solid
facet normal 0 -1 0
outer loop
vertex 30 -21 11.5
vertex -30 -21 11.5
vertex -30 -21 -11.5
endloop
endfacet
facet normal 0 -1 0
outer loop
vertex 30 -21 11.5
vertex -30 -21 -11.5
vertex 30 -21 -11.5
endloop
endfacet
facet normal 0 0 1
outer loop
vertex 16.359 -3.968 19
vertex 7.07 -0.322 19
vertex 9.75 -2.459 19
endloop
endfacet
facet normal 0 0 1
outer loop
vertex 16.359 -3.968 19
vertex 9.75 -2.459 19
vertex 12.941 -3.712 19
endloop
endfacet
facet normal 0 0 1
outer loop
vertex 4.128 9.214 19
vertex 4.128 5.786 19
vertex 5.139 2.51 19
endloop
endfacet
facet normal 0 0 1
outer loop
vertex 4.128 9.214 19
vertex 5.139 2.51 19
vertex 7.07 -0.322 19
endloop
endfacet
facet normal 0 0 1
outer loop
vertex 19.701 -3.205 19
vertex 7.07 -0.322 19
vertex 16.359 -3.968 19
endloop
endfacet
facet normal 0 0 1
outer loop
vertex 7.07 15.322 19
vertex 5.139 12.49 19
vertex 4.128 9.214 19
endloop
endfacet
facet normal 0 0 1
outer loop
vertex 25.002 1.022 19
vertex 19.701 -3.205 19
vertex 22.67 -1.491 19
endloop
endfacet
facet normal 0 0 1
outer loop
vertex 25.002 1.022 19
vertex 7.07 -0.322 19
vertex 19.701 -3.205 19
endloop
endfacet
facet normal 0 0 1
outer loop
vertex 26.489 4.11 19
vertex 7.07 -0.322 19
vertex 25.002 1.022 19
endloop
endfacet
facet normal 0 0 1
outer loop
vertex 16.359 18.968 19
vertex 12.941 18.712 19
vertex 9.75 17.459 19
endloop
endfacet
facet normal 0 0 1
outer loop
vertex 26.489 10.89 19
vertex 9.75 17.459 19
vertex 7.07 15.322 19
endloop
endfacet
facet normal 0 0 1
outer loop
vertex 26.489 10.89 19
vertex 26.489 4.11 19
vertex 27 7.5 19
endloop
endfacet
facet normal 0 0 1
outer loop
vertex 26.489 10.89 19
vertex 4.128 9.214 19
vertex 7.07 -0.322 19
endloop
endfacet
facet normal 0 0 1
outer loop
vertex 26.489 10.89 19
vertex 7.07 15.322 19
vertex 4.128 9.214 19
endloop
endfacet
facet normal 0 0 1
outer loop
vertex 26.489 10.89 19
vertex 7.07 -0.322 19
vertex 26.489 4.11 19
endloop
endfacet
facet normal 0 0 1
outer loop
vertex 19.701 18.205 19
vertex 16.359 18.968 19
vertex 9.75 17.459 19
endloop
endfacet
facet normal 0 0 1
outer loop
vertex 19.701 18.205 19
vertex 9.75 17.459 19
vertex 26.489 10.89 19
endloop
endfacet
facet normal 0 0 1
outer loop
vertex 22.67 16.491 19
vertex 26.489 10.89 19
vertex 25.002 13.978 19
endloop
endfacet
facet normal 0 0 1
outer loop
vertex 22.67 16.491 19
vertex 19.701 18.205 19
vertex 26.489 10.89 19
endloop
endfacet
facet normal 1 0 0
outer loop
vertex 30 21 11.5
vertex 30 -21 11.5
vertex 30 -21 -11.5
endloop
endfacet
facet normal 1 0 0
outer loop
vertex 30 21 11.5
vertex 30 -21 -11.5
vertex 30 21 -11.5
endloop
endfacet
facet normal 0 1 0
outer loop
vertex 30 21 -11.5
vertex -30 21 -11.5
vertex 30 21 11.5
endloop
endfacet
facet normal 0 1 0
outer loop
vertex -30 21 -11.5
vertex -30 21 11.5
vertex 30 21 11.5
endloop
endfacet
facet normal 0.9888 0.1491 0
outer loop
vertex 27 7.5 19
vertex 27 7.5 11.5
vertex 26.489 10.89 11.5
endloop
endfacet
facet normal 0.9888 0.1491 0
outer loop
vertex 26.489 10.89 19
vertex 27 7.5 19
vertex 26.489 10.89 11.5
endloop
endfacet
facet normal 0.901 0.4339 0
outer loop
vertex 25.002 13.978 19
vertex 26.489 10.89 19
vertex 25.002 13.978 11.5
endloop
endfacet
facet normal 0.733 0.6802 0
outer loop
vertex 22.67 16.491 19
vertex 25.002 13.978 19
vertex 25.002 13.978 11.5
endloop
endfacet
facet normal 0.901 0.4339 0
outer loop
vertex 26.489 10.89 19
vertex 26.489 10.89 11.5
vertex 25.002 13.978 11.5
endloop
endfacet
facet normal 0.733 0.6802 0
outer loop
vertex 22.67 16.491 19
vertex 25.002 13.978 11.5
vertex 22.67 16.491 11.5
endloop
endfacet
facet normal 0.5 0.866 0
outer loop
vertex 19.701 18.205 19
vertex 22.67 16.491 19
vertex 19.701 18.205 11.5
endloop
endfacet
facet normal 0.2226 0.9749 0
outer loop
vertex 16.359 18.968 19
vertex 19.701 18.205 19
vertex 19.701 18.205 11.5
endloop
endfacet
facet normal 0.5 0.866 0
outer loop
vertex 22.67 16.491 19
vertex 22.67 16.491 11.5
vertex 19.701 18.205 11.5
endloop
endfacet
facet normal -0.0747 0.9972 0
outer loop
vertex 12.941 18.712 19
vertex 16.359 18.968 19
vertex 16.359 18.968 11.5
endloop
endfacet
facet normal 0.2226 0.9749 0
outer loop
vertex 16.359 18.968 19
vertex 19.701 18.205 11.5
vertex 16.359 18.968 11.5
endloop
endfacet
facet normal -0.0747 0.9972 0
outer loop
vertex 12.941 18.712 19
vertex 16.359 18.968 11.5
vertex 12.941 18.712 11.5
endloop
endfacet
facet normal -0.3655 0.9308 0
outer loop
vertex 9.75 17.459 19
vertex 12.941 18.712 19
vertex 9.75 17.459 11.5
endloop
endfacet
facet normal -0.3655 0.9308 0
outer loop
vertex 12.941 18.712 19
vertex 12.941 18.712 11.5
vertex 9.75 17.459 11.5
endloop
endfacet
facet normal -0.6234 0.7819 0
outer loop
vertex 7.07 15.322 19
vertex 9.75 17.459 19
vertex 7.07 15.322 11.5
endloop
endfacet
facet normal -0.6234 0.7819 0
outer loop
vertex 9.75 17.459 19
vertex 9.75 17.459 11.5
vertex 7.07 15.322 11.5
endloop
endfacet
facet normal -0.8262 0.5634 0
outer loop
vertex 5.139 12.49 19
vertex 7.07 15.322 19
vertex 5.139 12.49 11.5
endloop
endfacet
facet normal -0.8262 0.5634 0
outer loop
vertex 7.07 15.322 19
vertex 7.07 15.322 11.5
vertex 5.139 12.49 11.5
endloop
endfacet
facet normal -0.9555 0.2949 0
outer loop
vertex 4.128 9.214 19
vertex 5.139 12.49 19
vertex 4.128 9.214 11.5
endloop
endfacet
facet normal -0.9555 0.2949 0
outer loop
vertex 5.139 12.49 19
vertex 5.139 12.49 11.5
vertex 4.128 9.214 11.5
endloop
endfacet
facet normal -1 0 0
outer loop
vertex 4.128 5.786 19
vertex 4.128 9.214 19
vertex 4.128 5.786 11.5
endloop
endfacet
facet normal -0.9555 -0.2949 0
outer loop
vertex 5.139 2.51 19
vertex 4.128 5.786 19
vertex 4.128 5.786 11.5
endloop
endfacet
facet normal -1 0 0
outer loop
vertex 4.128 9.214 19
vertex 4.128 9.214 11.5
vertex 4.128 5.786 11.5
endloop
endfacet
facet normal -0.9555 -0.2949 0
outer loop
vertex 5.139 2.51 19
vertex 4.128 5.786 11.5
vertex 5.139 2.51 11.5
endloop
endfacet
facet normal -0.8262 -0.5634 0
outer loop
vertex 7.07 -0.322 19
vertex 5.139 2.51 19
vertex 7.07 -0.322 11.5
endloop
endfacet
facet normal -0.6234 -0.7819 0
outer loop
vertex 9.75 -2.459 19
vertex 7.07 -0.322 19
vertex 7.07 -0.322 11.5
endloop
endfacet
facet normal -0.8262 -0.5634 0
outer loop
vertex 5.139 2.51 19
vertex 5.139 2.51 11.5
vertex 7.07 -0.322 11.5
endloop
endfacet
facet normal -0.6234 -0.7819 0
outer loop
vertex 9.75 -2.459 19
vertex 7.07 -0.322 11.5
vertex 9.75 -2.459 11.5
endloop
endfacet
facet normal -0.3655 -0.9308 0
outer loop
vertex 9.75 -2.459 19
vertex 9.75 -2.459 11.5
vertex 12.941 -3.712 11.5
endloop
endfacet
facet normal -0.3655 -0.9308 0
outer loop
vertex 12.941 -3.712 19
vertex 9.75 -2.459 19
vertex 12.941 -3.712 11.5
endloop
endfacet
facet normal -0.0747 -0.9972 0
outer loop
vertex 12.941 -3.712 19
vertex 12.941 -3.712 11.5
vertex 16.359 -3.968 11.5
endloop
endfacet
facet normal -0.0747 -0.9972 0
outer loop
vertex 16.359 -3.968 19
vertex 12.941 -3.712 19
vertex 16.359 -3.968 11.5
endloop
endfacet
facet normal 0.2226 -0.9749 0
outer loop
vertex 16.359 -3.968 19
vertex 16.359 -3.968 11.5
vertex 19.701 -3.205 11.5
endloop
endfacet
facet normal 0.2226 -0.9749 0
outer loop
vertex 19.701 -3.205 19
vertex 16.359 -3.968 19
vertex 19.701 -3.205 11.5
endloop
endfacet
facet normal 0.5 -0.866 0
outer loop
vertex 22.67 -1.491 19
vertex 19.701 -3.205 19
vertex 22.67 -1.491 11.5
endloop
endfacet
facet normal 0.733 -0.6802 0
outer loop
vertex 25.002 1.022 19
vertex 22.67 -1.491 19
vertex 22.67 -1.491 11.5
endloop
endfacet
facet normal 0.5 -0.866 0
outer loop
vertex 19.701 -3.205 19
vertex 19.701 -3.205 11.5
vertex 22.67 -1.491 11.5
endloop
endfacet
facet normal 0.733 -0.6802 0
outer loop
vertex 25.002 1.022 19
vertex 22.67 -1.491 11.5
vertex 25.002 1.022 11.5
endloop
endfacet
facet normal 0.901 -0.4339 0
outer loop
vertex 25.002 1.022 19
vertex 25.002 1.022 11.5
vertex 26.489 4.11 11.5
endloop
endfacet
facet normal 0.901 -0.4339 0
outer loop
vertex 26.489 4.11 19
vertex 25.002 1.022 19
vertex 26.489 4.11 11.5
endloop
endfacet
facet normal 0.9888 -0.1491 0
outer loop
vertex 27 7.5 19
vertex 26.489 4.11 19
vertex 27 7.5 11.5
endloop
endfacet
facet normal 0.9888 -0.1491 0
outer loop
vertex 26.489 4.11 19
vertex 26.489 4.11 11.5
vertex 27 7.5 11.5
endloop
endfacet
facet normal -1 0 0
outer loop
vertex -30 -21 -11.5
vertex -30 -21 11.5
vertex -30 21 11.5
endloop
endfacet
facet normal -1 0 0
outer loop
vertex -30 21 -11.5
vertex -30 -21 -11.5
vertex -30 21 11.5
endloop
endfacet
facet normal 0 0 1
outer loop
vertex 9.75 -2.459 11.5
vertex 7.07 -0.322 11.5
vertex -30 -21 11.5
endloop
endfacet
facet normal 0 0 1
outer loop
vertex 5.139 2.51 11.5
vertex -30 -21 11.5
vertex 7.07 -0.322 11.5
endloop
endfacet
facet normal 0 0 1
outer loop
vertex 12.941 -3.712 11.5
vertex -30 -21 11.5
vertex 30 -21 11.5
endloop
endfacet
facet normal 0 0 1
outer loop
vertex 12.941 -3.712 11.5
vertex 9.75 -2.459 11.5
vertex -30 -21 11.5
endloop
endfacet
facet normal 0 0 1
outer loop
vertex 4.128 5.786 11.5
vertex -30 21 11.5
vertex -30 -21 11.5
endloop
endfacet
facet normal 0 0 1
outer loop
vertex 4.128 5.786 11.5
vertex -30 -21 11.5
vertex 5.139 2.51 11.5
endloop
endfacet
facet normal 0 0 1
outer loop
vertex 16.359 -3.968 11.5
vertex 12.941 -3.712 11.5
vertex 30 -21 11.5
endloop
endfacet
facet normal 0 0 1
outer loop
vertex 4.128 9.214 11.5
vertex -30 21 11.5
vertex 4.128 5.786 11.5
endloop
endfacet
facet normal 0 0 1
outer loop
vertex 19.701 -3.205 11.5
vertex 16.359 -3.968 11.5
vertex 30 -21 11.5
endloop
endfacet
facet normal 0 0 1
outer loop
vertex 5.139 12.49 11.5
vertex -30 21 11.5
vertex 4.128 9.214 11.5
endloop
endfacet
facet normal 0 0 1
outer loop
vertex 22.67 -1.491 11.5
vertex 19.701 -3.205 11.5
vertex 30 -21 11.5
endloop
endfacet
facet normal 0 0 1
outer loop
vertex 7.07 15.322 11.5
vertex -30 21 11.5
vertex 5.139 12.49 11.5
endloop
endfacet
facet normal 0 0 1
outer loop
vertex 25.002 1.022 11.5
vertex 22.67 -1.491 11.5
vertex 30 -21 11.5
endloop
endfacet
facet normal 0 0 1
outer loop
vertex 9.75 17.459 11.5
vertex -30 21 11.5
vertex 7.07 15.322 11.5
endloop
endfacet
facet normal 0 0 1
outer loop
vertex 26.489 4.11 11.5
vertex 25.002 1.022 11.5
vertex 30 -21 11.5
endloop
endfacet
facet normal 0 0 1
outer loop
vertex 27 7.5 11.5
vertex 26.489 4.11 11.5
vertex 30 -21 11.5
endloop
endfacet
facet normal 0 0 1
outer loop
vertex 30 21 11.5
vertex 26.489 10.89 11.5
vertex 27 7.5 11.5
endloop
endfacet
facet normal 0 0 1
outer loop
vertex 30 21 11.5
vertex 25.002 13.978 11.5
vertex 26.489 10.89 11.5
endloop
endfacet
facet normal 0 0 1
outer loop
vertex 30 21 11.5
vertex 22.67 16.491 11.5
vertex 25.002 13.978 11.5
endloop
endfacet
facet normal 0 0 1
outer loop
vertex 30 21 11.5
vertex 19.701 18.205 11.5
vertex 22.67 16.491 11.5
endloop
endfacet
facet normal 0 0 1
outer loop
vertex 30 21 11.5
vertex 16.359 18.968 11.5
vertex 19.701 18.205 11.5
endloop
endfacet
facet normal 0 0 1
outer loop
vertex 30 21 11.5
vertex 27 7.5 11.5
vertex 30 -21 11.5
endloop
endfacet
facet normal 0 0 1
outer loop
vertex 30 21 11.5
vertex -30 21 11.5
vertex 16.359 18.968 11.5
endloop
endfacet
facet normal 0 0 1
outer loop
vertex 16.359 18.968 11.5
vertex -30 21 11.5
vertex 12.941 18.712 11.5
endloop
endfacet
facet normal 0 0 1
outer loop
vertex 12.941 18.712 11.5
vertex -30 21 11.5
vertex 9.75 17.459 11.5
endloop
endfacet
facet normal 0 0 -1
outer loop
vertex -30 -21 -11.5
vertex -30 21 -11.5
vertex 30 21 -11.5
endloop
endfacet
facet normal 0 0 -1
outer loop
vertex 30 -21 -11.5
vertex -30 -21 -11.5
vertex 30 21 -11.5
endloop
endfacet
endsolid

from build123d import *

# Parameters (mm, degrees)
SKETCH_1_W      = 60
SKETCH_1_H      = 42
SKETCH_1_R      = 11.5
EXTRUDE_1_DEPTH = 11.5
EXTRUDE_START   = 11.5
SKETCH_1_3_R    = 11.5
EXTRUDE_2_DEPTH = 7.5


with BuildPart() as part:
    # Эскиз1 → Бобышка-Вытянуть1 (new, symmetric)
    with BuildSketch(Plane.XY):
        Rectangle(SKETCH_1_W, SKETCH_1_H)
        with Locations((15.5, 7.5)):
            Circle(SKETCH_1_R, mode=Mode.SUBTRACT)
        with Locations((15.5, 7.5)):
            Circle(SKETCH_1_R)
    extrude(amount=EXTRUDE_1_DEPTH, both=True)

    # Эскиз1<3> → Бобышка-Вытянуть2 (add)
    with BuildSketch(Plane.XY.offset(EXTRUDE_START)):
        with Locations((15.5, 7.5)):
            Circle(SKETCH_1_3_R)
    extrude(amount=EXTRUDE_2_DEPTH)


solid = part.part
